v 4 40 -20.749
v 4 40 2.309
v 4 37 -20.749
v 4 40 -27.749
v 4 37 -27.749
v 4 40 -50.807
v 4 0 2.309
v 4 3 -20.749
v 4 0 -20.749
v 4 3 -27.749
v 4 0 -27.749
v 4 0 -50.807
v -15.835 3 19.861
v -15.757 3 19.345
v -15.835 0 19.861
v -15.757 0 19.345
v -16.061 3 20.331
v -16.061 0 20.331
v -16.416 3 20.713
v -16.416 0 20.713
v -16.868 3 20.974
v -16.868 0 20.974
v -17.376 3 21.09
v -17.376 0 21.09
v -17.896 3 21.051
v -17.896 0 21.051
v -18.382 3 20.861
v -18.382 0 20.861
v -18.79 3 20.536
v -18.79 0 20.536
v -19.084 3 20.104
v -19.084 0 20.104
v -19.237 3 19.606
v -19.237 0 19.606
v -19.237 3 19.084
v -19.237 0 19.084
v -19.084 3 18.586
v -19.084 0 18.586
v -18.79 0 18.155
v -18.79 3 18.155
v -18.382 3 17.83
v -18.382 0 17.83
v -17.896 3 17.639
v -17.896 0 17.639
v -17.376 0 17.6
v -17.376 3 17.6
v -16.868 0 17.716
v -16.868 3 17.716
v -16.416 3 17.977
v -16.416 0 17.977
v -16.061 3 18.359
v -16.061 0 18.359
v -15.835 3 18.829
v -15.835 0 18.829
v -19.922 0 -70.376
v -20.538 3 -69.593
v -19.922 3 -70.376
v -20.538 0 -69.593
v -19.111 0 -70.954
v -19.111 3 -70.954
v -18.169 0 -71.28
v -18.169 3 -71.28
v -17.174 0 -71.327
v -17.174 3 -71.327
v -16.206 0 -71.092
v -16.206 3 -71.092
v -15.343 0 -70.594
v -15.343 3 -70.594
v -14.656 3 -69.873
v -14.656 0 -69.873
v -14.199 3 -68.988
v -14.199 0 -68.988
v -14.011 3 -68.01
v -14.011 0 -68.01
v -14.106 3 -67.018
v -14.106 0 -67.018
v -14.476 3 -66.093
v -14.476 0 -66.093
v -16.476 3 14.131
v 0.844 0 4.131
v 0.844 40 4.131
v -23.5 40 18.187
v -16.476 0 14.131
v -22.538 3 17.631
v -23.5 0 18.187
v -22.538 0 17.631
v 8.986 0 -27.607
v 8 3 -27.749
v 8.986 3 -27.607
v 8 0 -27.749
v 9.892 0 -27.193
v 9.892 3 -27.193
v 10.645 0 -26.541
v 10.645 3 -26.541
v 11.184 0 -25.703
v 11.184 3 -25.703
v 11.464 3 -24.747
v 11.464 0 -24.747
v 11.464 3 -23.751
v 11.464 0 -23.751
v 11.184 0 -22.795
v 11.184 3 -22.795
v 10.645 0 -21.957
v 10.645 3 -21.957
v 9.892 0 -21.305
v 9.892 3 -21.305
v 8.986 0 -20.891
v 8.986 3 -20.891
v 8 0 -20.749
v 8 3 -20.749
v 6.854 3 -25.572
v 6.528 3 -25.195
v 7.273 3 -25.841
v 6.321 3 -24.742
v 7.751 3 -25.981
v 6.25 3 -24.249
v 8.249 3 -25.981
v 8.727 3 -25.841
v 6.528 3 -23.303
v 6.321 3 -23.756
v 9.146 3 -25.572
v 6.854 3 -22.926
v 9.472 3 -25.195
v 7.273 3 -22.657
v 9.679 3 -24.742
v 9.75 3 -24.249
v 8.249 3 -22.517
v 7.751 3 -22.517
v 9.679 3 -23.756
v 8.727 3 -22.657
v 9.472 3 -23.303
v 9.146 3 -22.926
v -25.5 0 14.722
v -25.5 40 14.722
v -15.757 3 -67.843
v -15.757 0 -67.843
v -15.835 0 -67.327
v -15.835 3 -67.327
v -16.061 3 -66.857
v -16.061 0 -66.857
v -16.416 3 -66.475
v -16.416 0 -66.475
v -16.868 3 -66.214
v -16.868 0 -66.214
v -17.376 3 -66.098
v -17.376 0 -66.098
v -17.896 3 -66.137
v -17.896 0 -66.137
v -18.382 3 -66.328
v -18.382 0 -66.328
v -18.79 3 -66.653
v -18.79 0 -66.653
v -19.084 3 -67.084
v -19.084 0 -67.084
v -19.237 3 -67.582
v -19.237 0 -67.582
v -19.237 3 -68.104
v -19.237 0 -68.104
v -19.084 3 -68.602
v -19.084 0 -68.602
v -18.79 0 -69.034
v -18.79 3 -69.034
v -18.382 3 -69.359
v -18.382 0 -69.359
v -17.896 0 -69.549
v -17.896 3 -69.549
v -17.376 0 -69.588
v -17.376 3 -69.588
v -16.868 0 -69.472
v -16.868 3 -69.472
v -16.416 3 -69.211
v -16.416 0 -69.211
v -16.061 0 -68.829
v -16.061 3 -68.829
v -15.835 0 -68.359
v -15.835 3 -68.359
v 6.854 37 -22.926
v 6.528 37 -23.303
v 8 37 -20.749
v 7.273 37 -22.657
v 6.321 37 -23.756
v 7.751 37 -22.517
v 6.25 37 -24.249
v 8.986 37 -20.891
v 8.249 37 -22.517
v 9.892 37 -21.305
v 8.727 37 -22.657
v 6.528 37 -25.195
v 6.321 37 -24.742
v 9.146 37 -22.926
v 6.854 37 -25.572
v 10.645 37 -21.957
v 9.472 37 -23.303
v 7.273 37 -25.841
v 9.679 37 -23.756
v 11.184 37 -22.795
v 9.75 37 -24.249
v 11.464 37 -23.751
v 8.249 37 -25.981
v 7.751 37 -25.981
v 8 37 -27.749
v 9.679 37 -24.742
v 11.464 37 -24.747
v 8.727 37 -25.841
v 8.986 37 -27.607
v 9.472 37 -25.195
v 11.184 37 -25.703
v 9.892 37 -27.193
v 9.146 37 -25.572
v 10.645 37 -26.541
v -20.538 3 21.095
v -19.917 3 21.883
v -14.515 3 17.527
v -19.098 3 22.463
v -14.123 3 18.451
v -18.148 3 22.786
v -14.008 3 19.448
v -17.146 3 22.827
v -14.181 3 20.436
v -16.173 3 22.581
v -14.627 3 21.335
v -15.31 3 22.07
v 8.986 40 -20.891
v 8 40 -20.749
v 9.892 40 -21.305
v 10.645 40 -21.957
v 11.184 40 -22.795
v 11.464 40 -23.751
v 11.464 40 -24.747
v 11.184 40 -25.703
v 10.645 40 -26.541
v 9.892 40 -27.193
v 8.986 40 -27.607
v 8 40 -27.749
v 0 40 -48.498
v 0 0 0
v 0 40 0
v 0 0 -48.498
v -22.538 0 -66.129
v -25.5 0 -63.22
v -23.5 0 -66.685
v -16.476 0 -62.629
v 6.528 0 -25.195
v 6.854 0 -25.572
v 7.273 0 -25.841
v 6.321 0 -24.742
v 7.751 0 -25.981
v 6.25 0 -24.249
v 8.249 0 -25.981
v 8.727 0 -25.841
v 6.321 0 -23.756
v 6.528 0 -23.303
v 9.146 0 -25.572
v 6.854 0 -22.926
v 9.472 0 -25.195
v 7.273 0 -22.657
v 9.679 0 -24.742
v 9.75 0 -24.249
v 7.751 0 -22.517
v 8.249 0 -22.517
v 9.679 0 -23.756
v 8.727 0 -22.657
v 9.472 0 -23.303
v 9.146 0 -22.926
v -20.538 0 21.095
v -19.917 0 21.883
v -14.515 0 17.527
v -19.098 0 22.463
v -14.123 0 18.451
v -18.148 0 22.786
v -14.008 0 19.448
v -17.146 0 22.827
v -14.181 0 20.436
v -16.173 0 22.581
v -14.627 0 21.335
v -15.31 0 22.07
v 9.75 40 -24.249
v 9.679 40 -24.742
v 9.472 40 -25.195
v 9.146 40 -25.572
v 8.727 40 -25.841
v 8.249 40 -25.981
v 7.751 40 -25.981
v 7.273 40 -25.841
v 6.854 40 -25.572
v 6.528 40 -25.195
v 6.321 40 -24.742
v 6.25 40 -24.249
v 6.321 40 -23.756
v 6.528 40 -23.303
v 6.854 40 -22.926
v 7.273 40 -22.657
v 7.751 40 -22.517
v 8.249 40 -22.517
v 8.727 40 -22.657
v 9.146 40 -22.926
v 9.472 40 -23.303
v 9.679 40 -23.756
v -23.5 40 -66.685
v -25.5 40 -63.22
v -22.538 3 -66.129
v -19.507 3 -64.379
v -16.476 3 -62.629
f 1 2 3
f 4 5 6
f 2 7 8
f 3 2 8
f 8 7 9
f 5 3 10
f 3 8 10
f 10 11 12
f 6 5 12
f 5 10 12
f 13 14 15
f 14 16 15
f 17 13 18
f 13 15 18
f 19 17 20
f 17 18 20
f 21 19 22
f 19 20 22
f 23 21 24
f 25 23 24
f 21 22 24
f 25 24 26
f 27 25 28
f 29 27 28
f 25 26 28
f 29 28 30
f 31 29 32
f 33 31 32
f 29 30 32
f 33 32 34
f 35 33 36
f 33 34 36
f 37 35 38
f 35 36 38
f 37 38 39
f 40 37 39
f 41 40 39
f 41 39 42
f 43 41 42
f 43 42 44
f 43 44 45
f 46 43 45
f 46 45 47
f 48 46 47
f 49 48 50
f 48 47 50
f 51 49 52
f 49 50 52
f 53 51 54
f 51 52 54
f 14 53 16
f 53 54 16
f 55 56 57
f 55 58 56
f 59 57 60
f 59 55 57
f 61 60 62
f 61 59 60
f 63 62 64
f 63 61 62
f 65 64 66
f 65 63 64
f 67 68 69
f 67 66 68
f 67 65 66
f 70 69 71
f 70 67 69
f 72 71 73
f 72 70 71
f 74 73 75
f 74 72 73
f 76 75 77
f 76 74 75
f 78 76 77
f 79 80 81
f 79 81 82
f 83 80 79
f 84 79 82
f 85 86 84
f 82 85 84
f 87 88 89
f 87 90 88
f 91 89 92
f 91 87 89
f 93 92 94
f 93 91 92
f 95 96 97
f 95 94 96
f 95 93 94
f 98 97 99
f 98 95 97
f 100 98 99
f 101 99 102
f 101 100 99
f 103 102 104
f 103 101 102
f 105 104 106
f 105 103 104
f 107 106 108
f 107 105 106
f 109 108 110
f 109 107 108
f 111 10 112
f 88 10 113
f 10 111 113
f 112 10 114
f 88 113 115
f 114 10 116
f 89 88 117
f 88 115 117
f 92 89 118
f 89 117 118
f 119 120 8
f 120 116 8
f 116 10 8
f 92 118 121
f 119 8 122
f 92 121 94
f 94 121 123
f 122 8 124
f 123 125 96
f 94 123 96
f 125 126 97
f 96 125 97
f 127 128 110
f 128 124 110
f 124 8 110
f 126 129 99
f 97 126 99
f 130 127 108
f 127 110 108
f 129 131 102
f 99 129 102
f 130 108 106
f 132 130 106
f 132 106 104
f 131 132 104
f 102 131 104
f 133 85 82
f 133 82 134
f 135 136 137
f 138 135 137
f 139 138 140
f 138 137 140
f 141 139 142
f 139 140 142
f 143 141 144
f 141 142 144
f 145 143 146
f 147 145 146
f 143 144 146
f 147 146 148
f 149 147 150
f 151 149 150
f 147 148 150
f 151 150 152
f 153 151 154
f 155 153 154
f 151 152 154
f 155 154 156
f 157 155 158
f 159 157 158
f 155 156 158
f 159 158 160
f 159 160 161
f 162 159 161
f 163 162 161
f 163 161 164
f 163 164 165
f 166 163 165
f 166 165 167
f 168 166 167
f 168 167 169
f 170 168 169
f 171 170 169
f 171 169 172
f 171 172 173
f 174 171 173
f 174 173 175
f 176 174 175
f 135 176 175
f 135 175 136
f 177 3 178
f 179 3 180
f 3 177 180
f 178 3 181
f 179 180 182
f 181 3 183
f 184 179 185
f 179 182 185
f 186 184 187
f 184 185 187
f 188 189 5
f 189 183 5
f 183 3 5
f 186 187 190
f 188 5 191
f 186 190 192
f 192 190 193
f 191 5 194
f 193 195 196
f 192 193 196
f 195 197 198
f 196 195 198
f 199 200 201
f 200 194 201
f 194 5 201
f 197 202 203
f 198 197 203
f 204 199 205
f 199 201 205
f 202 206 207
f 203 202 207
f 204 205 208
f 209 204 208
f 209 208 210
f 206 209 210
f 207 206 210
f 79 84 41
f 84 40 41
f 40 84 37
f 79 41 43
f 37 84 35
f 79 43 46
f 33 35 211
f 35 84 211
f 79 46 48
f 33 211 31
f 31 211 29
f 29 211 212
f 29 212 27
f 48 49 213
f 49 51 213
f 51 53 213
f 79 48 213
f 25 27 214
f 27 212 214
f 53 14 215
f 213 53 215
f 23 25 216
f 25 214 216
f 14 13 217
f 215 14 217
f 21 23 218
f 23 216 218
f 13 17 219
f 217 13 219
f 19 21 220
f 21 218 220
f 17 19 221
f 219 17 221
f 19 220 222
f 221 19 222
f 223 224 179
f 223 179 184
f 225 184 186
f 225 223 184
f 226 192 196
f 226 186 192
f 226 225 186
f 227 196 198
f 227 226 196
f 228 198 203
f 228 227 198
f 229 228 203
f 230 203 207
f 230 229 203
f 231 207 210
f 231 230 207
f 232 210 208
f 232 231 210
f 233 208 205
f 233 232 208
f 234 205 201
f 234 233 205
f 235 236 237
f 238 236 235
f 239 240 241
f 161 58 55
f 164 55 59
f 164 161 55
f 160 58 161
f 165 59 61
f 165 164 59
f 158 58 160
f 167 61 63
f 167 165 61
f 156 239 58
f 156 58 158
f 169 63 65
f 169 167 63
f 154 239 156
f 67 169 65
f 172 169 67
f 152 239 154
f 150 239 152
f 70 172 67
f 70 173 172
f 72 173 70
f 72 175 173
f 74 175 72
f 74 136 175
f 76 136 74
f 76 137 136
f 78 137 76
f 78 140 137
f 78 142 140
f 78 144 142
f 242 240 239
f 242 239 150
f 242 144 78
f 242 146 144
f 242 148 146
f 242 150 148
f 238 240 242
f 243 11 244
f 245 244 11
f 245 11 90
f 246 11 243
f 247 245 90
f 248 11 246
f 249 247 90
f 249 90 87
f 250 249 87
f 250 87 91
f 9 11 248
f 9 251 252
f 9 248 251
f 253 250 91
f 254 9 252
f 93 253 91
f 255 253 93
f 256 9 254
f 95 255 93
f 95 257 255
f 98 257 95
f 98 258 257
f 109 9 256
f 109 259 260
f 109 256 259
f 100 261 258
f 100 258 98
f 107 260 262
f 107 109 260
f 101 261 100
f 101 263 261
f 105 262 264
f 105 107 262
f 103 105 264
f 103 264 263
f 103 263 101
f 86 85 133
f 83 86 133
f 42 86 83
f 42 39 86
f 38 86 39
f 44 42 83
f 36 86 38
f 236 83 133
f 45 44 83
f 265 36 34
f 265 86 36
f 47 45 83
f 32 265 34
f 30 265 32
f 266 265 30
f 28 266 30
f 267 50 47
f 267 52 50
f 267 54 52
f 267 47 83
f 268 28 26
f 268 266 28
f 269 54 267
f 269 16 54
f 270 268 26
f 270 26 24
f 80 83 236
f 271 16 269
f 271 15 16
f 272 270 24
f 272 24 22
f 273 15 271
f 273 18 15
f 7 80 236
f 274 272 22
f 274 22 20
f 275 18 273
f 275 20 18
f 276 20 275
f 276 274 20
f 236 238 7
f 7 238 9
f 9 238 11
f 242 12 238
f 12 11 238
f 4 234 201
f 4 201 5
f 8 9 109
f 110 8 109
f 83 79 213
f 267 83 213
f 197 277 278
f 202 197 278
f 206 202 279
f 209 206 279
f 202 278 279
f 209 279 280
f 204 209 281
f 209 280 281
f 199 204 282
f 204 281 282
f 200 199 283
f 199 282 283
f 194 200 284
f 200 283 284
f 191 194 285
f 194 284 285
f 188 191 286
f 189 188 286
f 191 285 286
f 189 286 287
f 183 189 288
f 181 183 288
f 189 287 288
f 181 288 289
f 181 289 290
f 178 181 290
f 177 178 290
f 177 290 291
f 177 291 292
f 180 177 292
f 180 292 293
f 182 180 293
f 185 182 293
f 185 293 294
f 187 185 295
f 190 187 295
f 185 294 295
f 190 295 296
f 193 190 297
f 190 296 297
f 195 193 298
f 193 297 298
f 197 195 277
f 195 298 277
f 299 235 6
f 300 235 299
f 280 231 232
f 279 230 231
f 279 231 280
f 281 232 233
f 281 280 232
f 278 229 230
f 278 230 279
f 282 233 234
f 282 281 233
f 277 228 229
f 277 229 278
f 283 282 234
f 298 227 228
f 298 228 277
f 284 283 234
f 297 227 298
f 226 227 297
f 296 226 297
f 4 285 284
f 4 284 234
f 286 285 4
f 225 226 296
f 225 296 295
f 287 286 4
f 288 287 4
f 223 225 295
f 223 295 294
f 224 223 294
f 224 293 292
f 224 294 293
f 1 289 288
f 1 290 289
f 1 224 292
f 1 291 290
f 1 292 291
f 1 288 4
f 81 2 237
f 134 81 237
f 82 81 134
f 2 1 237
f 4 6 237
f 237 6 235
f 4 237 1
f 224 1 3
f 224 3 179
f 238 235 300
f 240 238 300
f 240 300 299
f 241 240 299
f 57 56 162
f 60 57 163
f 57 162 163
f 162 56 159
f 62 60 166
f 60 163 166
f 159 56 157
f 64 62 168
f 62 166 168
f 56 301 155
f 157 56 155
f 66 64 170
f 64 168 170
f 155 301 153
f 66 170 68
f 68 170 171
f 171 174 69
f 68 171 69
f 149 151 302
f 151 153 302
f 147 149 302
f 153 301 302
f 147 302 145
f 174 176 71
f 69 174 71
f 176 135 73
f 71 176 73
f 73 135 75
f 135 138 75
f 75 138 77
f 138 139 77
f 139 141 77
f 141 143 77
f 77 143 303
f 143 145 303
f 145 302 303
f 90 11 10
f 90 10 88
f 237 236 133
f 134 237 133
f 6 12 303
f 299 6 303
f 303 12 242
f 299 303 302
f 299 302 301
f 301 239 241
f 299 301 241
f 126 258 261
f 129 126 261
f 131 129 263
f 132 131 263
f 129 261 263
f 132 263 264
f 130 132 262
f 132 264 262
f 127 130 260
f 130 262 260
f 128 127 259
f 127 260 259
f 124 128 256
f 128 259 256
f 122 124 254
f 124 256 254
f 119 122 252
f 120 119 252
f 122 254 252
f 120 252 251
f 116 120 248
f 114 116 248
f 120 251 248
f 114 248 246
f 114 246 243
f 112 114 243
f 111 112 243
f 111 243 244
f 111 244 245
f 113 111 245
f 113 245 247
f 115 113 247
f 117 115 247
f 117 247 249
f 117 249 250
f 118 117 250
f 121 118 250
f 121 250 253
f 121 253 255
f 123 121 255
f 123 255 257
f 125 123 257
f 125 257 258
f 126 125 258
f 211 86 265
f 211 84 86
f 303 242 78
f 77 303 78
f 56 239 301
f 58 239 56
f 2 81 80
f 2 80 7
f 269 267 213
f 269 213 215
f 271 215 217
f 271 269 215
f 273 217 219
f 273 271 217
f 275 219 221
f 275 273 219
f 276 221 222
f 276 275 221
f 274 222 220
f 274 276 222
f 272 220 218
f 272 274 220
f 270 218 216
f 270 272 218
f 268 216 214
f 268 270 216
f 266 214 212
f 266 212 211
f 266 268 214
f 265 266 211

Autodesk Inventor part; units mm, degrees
ref_plane "YZ Plane" through (0, 0, 0) normal (1, 0, 0) x (0, 1, 0)
ref_plane "XZ Plane" through (0, 0, 0) normal (0, 1, 0) x (-1, 0, 0)
ref_plane "XY Plane" through (0, 0, 0) normal (0, 0, 1) x (1, 0, 0)
sketch "Sketch1" plane through (0, 0, 0) normal (0, 1, 0) x (-1, 0, 0)
  line L0 (0, 0) -> (0, -48.498)
  line L1 (0, 0) -> (25.5001, 14.7225)
  line L2 (0, 0) -> (29.445, 0) construction
  line L3 (0, -48.498) -> (25.5001, -63.2205)
  line L4 (0, -48.498) -> (29.445, -48.498) construction
  line L5 (25.5001, -63.2205) -> (23.5001, -66.6846)
  line L6 (0, -46.9861) -> (-4, -46.9861)
  line L7 (-4, -46.9861) -> (-4, -50.8074)
  line L8 (-4, -50.8074) -> (23.5001, -66.6846)
  line L9 (1.1556, 0.6672) -> (-0.8444, 4.1313)
  line L10 (-0.8444, 4.1313) -> (-4, 2.3094)
  line L11 (-4, 2.3094) -> (-4, -46.9861)
  line L12 (-0.8444, 4.1313) -> (23.5001, 18.1866)
  line L13 (23.5001, 18.1866) -> (25.5001, 14.7225)
  dimension "d0" = 48.498
  dimension "d1" = 29.445
  dimension "d2" = 30
  dimension "d3" = 29.445
  dimension "d4" = 30
  dimension "d5" = 4
  dimension "d6" = 4
  dimension "d7" = 4
extrude "Extrusion1" add sketch "Sketch1" along normal blind 40
sketch "Sketch2" plane through (0, 0, 0) normal (0, -1, 0) x (1, 0, 0)
  line L0 (0, 0) -> (-25.5001, 14.7225) projected
  line L1 (-25.5001, 14.7225) -> (-23.1946, 18.7157)
  line L2 (-25.5001, 14.7225) -> (-23.5001, 18.1866) projected
  line L3 (-23.1946, 18.7157) -> (-25.5001, 14.7225)
  line L4 (-25.5001, 14.7225) -> (-21.5069, 12.417)
  line L5 (-21.5069, 12.417) -> (-17.5069, 19.3452)
  circle A0 centre (-17.5069, 19.3452) radius 1.75
  circle A1 centre (-17.5069, 19.3452) radius 3.5
  line L6 (-20.538, 21.0952) -> (-22.538, 17.6311)
  line L7 (-23.5001, 18.1866) -> (4, 2.3094) projected
  line L8 (-14.4758, 17.5952) -> (-16.4758, 14.1311)
  dimension "d10" = 4.611
  dimension "d11" = 4.611
  dimension "d12" = 8
  dimension "d13" = 3.5
  dimension "d14" = 7
extrude "Extrusion2" add sketch "Sketch2" against normal blind 3 contours A1
sketch "Sketch3" plane through (-17.5069, 3, 19.3452) normal (0, 1, 0) x (1, 0, 0)
  circle A0 centre (0, 0) radius 1.75 projected
  line L0 (0, 0) -> (-2, 3.4641)
  line L1 (-5.9932, 1.1586) -> (21.5069, 17.0358) projected
  line L2 (-2, 3.4641) -> (-5.0311, 1.7141)
  line L3 (-5.0311, 1.7141) -> (-3.0311, -1.75)
  circle A1 centre (0, 0) radius 3.5 projected
  line L4 (-2, 3.4641) -> (1.0311, 5.2141)
  line L5 (1.0311, 5.2141) -> (2.9919, 1.8179)
  line L6 (2.9919, 1.8179) -> (1.5256, 0.9713)
  line L7 (1.5256, 0.9713) -> (0.9971, 2.6723)
  line L8 (0.9971, 2.6723) -> (-1.1427, 2.5009)
  line L9 (-1.1427, 2.5009) -> (-2.2108, 1.3125)
  line L10 (-2.2108, 1.3125) -> (-2.3481, -0.99)
  line L11 (-2.3481, -0.99) -> (-3.0311, -1.75)
  point P0 (17.5069, 19.3452)
  dimension "d17" = 3.5
  dimension "d18" = 3.5
extrude "Extrusion3" add sketch "Sketch3" against normal blind 3 contours L9 L10 L11 A1 L0 | L0 A1 L6 L7 L8 L9 | A1 L3 L1 L0 | L0 L1 L5 A1
sketch "Sketch4" plane through (0, 0, 0) normal (0, -1, 0) x (1, 0, 0)
  line L0 (-23.5001, -66.6846) -> (-25.5001, -63.2205) projected
  line L1 (-23.5001, -66.6846) -> (-21.1946, -70.6778)
  line L2 (-21.1946, -70.6778) -> (-23.5001, -66.6846)
  line L3 (-25.5001, -63.2205) -> (0, -48.498) projected
  line L4 (-25.5001, -63.2205) -> (-21.5069, -60.915)
  line L5 (-21.5069, -60.915) -> (-17.5069, -67.8432)
  circle A0 centre (-17.5069, -67.8432) radius 1.75
  circle A1 centre (-17.5069, -67.8432) radius 3.5
  line L6 (-19.5069, -64.3791) -> (-22.538, -66.1291)
  line L7 (4, -50.8074) -> (-23.5001, -66.6846) projected
  line L8 (-22.538, -66.1291) -> (-20.538, -69.5932)
  line L9 (-19.5069, -64.3791) -> (-16.4758, -62.6291)
  line L10 (-16.4758, -62.6291) -> (-14.4758, -66.0932)
  point P0 (0, 0)
  dimension "d21" = 4.611
  dimension "d22" = 4.611
  dimension "d23" = 8
  dimension "d24" = 3.5
  dimension "d25" = 7
  dimension "d26" = 3.5
  dimension "d27" = 3.5
extrude "Extrusion4" add sketch "Sketch4" against normal blind 3 contours L6 L5 A1 L8 | L7 L10 A1 L5 | A1
sketch "Sketch5" plane through (0, 0, 0) normal (0, -1, 0) x (1, 0, 0)
  line L0 (0, -48.498) -> (0, 0) projected
  line L1 (0, -24.249) -> (8, -24.249)
  circle A0 centre (8, -24.249) radius 1.75
  circle A1 centre (8, -24.249) radius 3.5
  line L2 (4, 2.3094) -> (4, -50.8074) projected
  line L3 (4, -24.249) -> (4, -27.749)
  line L4 (4, -27.749) -> (8, -27.749)
  line L5 (4, -24.249) -> (4, -20.749)
  line L6 (4, -20.749) -> (8, -20.749)
  dimension "d30" = 8
  dimension "d31" = 3.5
  dimension "d32" = 7
extrude "Extrusion5" add sketch "Sketch5" against normal blind 3
sketch "Sketch6" plane through (0, 40, 0) normal (0, 1, 0) x (1, 0, 0)
  line L0 (4, -2.3094) -> (4, 50.8074) projected
  line L1 (4, 24.249) -> (8, 24.249)
  circle A0 centre (8, 24.249) radius 1.75
  circle A1 centre (8, 24.249) radius 3.5
  line L2 (4, 27.749) -> (4, 50.8074) projected
  line L3 (4, 24.249) -> (4, 27.749)
  line L4 (8, 27.749) -> (4, 27.749) projected
  line L5 (4, 27.749) -> (8, 27.749)
  line L6 (4, 24.249) -> (4, 20.749)
  line L7 (4, 20.749) -> (8, 20.749) projected
  line L8 (4, 20.749) -> (8, 20.749)
  point P0 (0, 0)
  dimension "d35" = 4
  dimension "d36" = 3.5
  dimension "d37" = 7
extrude "Extrusion6" add sketch "Sketch6" against normal blind 3
properties part number "Capture Zone3"
